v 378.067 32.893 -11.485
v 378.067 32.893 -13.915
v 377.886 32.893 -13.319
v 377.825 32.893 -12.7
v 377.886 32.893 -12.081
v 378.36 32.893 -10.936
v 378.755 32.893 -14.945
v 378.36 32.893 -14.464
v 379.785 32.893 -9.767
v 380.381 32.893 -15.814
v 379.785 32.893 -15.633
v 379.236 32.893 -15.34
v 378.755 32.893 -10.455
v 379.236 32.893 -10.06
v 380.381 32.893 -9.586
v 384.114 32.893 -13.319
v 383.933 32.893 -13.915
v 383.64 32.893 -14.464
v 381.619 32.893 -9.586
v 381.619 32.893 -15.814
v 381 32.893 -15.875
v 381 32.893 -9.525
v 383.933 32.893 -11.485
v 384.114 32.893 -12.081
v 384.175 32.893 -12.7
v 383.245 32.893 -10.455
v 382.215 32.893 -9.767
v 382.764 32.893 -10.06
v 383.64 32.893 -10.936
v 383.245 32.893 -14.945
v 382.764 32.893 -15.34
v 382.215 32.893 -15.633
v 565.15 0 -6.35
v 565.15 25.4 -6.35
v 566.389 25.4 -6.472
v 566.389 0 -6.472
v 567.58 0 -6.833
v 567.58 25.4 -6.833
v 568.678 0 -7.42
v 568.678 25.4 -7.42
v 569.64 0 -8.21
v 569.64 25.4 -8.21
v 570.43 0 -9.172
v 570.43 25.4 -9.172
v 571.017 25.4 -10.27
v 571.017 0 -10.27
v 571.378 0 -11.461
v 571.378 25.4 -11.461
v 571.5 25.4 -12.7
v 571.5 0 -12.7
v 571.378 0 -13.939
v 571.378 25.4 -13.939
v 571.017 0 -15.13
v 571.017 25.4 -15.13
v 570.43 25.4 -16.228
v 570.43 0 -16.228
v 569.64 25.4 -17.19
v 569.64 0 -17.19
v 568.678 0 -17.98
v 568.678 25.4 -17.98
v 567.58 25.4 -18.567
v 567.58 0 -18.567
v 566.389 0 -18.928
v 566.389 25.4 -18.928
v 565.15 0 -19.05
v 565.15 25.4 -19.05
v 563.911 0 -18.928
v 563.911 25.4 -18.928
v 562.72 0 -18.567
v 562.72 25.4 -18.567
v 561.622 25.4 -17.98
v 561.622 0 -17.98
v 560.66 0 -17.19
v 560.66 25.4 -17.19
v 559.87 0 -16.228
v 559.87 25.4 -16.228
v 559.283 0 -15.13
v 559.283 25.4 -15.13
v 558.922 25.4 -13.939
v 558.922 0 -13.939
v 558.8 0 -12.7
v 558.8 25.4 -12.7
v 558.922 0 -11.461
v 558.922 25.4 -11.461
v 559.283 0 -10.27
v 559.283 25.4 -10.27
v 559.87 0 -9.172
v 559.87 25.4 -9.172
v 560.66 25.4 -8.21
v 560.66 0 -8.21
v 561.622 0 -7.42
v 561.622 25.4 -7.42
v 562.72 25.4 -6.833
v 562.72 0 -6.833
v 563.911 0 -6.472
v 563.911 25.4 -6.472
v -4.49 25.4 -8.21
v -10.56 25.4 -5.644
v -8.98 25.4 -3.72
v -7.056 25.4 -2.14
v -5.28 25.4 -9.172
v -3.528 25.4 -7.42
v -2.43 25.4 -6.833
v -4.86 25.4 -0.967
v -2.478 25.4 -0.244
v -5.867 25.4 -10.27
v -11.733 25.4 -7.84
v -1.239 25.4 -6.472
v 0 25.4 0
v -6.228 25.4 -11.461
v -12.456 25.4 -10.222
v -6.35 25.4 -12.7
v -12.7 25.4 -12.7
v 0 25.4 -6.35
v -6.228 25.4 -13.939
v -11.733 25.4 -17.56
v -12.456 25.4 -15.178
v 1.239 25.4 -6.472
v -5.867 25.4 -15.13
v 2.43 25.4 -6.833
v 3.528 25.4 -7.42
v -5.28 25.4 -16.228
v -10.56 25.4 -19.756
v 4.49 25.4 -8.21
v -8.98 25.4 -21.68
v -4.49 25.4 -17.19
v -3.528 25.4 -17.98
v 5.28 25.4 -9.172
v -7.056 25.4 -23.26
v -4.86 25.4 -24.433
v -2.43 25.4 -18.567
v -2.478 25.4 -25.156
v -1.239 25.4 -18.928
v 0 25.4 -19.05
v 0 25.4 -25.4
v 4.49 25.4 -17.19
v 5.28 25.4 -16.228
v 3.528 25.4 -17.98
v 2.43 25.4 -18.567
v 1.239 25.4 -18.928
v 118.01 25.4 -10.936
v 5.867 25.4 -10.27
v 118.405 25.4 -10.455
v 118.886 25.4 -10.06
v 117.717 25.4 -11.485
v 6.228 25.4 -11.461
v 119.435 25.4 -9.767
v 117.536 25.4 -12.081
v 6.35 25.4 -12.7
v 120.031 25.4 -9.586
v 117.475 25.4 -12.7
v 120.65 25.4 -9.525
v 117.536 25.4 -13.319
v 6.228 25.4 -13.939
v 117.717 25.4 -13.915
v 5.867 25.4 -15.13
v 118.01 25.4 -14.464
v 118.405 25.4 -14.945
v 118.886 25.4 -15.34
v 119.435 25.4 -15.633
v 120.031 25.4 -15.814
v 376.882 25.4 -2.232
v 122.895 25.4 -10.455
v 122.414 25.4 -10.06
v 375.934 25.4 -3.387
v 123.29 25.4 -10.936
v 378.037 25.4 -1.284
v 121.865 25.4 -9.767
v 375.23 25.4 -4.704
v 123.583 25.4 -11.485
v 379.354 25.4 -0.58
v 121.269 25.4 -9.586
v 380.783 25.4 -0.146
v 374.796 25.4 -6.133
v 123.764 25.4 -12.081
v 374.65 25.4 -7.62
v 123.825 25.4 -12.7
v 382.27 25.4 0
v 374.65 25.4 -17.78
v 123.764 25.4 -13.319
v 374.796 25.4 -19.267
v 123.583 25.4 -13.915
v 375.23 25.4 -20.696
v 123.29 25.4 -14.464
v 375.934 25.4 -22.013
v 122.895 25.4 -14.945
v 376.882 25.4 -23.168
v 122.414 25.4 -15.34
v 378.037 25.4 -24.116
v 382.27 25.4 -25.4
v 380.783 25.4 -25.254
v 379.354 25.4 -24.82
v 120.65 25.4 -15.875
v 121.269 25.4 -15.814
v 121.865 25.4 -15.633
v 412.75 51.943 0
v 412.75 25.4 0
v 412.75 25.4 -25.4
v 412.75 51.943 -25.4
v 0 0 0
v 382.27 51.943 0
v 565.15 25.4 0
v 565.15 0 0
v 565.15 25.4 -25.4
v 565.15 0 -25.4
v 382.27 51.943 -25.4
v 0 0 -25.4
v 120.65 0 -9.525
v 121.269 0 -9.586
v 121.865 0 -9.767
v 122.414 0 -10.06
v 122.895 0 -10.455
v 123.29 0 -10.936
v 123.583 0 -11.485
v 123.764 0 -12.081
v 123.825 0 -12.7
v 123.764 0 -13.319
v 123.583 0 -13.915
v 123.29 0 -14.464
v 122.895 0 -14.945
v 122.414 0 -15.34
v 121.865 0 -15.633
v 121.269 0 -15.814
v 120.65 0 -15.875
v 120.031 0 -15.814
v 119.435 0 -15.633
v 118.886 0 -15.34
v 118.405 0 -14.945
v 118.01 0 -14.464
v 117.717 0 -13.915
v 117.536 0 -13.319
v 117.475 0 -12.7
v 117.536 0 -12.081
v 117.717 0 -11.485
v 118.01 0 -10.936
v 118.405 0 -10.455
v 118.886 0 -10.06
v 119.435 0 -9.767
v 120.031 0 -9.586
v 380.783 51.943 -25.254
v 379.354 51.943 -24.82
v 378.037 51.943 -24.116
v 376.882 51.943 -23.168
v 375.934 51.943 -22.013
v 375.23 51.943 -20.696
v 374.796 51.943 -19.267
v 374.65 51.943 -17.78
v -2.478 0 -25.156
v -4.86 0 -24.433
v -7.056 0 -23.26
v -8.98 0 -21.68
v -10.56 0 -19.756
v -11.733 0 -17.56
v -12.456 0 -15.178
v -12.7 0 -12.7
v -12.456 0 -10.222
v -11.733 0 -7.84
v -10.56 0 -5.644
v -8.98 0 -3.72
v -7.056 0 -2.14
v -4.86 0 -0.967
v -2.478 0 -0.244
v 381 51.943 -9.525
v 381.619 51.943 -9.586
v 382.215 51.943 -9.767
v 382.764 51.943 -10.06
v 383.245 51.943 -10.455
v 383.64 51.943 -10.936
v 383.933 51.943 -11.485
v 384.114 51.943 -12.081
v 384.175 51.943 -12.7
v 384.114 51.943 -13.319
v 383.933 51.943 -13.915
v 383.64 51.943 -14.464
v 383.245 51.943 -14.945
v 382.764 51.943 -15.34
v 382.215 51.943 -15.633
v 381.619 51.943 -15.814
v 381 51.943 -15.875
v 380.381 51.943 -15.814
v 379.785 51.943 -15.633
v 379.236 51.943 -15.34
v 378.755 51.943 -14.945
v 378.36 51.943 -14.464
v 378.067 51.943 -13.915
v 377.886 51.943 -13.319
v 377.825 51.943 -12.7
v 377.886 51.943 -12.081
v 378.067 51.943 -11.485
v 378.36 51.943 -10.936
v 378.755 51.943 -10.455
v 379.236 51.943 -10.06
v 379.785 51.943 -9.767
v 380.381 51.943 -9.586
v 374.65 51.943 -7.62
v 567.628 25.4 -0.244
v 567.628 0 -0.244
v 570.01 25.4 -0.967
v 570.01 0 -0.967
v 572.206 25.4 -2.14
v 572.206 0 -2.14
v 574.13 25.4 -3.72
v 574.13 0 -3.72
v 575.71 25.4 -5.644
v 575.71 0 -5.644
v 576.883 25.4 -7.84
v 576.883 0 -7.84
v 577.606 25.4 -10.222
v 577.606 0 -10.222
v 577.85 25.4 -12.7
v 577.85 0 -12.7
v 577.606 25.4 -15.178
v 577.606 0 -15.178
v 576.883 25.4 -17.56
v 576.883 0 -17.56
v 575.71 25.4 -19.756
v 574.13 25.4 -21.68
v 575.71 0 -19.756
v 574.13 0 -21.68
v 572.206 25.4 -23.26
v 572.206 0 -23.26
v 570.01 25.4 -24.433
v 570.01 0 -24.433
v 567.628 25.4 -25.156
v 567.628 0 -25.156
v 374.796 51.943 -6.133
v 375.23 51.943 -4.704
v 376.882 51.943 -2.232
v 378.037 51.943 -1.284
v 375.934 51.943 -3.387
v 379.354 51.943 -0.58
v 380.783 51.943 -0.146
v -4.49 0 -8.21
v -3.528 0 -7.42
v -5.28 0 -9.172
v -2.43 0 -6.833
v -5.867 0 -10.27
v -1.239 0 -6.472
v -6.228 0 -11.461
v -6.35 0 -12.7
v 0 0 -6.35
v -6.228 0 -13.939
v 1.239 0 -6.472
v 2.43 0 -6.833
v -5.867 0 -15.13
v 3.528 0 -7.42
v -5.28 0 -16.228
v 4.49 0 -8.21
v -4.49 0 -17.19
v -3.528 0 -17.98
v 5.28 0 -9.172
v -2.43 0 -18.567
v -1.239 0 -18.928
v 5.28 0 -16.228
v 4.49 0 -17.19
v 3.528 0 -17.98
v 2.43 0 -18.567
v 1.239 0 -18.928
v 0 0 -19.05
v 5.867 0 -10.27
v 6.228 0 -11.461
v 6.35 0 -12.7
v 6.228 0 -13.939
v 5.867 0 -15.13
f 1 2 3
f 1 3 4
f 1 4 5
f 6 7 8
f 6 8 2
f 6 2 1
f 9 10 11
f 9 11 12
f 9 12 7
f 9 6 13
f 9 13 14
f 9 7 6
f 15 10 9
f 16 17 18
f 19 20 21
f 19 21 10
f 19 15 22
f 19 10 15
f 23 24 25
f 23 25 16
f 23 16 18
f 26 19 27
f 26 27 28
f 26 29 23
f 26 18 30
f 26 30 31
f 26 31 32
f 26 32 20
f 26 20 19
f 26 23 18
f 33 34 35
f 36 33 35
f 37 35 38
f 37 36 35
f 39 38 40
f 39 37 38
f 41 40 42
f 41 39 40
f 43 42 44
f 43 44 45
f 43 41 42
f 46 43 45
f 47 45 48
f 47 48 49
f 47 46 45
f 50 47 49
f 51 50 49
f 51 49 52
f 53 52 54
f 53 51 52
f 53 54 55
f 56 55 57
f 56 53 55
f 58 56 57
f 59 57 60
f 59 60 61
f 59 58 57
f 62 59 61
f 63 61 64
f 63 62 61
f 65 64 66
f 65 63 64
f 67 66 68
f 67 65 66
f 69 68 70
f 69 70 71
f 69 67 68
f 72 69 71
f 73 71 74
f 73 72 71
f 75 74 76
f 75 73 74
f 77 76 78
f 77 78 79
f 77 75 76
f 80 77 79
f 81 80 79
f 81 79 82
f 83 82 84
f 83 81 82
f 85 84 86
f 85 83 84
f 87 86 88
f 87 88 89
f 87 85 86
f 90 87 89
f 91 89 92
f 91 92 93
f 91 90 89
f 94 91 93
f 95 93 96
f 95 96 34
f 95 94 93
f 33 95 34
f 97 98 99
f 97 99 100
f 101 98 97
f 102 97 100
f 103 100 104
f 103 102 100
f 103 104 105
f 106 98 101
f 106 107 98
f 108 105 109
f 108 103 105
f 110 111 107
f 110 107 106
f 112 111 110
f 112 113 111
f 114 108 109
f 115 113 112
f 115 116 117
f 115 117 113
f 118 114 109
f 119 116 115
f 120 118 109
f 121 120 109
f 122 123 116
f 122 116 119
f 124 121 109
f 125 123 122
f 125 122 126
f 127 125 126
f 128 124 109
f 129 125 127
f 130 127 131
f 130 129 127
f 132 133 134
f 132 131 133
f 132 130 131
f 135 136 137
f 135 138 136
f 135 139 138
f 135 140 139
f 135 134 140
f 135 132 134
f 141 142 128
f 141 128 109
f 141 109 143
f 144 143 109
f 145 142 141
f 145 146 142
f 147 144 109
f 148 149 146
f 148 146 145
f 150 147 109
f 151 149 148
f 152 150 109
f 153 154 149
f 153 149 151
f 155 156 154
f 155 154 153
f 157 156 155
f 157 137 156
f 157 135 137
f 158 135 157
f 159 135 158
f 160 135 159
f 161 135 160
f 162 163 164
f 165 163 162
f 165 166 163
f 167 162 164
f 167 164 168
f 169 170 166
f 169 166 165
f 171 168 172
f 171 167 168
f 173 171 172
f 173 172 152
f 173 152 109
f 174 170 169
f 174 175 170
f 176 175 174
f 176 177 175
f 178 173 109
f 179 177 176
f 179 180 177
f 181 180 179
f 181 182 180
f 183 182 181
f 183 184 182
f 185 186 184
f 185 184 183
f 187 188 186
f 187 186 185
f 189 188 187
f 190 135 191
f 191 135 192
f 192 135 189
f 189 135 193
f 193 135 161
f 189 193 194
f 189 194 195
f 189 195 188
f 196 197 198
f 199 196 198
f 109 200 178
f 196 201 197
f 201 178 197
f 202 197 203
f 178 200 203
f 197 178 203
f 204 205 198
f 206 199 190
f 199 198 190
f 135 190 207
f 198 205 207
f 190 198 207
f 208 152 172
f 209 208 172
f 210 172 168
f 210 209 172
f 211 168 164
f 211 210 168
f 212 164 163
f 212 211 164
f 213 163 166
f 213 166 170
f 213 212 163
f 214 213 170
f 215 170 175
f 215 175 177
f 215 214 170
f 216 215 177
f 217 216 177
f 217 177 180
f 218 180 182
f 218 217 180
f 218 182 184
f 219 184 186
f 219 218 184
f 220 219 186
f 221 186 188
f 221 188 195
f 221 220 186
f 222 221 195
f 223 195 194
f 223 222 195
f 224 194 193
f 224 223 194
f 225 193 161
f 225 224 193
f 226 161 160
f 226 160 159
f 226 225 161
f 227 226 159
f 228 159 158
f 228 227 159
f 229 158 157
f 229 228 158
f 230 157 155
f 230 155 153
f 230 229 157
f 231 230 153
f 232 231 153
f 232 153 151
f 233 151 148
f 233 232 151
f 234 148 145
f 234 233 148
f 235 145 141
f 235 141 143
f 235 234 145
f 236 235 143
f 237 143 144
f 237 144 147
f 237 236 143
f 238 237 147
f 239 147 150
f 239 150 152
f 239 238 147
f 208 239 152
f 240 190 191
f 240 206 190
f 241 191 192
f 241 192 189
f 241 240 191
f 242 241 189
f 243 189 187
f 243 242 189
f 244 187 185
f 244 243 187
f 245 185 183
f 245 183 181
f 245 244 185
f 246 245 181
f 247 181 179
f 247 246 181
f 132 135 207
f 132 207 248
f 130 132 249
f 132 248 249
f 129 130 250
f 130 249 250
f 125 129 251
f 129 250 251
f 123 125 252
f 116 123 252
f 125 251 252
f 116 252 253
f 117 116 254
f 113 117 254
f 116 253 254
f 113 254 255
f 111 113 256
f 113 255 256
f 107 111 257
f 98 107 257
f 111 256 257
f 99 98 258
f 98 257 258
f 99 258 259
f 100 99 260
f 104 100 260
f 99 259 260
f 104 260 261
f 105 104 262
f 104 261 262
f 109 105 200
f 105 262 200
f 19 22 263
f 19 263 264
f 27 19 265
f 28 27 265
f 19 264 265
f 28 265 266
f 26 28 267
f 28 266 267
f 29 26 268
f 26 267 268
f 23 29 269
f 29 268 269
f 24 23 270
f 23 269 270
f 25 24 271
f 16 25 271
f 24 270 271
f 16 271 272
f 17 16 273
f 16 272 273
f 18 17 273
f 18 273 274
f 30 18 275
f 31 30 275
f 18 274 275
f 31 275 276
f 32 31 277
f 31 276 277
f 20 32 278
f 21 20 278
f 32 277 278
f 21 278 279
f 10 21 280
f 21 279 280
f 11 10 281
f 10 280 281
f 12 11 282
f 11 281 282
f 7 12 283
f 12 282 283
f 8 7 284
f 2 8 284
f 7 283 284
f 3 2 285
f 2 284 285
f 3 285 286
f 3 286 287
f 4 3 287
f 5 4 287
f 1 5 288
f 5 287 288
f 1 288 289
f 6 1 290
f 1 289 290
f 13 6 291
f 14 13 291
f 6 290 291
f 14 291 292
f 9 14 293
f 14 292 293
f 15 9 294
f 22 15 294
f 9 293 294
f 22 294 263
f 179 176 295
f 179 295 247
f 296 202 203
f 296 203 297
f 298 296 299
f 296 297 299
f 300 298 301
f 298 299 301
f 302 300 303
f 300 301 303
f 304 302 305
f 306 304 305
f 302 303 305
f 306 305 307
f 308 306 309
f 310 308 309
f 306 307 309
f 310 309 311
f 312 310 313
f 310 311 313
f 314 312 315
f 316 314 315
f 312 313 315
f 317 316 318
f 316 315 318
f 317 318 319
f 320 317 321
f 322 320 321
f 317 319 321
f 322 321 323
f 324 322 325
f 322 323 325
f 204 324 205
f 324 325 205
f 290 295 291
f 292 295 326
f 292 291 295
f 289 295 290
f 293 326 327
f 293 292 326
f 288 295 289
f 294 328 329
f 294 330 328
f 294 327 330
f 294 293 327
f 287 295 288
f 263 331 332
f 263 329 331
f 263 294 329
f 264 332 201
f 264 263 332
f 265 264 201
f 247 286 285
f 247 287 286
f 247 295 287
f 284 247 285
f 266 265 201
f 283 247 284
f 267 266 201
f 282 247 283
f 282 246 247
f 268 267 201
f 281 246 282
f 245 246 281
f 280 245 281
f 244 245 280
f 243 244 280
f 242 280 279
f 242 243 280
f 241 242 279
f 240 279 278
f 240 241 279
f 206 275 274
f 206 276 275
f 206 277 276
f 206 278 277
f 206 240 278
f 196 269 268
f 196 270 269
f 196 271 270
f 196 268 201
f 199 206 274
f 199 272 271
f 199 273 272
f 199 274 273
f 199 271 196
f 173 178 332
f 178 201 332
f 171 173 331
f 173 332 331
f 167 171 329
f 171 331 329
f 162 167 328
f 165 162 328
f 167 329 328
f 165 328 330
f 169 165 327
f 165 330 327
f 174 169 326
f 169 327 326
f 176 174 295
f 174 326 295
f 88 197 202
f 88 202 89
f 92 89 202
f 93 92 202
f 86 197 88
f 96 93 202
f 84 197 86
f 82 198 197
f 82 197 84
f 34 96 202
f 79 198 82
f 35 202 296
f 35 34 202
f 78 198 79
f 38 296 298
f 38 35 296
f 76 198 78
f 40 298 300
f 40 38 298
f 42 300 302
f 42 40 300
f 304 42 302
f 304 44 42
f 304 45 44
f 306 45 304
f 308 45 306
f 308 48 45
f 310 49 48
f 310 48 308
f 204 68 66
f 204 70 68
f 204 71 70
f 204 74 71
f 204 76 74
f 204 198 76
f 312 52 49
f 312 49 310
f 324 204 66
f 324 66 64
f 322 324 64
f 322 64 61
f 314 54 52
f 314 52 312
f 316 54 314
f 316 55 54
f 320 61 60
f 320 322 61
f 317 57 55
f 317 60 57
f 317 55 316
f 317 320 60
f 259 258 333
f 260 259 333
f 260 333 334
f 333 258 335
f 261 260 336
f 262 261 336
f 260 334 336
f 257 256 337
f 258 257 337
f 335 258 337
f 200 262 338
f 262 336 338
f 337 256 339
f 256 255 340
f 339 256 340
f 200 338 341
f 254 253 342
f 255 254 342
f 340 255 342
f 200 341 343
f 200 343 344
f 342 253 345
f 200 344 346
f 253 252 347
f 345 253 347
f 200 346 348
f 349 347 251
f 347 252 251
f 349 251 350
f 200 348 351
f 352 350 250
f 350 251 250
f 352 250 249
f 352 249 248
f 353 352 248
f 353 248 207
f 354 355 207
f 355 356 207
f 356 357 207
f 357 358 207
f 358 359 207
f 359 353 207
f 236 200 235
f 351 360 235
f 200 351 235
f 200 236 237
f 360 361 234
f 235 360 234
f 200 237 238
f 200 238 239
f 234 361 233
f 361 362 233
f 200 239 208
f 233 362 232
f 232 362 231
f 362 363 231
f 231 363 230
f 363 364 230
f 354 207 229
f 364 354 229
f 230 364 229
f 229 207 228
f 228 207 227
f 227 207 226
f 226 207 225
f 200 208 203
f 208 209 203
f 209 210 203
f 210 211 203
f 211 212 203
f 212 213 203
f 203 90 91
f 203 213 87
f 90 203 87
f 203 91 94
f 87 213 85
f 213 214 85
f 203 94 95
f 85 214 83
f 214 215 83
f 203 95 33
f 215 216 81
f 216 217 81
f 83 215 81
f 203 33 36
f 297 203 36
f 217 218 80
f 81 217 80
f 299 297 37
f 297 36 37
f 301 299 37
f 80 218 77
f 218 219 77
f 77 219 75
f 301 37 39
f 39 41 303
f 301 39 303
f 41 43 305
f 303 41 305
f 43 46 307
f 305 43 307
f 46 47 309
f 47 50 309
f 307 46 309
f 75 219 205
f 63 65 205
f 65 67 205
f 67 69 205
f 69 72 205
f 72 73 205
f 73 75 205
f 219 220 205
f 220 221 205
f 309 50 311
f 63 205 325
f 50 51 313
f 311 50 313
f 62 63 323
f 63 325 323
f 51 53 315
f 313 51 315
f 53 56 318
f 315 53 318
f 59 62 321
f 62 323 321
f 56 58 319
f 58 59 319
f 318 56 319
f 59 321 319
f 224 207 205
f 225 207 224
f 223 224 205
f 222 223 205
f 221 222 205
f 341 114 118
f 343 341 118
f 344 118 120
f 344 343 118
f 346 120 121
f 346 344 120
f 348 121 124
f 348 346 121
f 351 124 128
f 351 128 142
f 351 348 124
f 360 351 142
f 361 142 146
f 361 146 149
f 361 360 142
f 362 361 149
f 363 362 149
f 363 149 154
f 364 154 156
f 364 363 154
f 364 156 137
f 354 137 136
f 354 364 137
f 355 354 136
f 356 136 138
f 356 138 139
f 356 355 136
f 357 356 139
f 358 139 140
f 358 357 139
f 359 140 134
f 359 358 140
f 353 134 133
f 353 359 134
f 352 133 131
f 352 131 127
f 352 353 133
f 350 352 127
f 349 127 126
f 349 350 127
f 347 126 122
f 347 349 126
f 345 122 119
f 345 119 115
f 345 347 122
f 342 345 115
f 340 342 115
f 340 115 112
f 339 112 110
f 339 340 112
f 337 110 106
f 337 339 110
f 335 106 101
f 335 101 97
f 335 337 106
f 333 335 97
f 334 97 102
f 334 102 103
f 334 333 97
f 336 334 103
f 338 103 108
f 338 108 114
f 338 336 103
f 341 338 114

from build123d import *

# Parameters (mm, degrees)
SKETCH2_R           = 6.35
SKETCH2_R_2         = 3.175
BOSS_EXTRUDE1_DEPTH = 25.4
SKETCH14_W          = 38.1
SKETCH14_H          = 25.4
BOSS_EXTRUDE2_DEPTH = 26.543
SKETCH15_R          = 3.175
CUT_EXTRUDE1_DEPTH  = 19.05
FILLET1_R           = 7.62


with BuildPart() as part:
    # Sketch2 → Boss-Extrude1 (new body)
    with BuildSketch(Plane(origin=(0, 0, 0), x_dir=(1, 0, 0), z_dir=(0, 1, 0))):
        with BuildLine():
            ThreePointArc((0, 25.4), (-12.7, 12.7), (0, 0))
            Line((0, 0), (565.15, 0))
            ThreePointArc((565.15, 0), (577.85, 12.7), (565.15, 25.4))
            Line((565.15, 25.4), (0, 25.4))
        make_face()
        with Locations(Location((0, 12.7, 0), (0, 0, 270))):
            Circle(SKETCH2_R, mode=Mode.SUBTRACT)
        with Locations(Location((120.65, 12.7, 0), (0, 0, 270))):
            Circle(SKETCH2_R_2, mode=Mode.SUBTRACT)
        with Locations(Location((565.15, 12.7, 0), (0, 0, 270))):
            Circle(SKETCH2_R, mode=Mode.SUBTRACT)
    extrude(amount=BOSS_EXTRUDE1_DEPTH)

    # Sketch14 → Boss-Extrude2 (add)
    with BuildSketch(Plane(origin=(0, 25.4, 0), x_dir=(1, 0, 0), z_dir=(0, 1, 0))):
        with Locations((393.7, 12.7)):
            Rectangle(SKETCH14_W, SKETCH14_H)
    extrude(amount=BOSS_EXTRUDE2_DEPTH)

    # Sketch15 → Cut-Extrude1 (cut)
    with BuildSketch(Plane(origin=(0, 51.943, 0), x_dir=(1, 0, 0), z_dir=(0, 1, 0))):
        with Locations(Location((381, 12.7, 0), (0, 0, 270))):
            Circle(SKETCH15_R)
    extrude(amount=-CUT_EXTRUDE1_DEPTH, mode=Mode.SUBTRACT)

    # Fillet1
    fillet1_edges = [part.edges().sort_by_distance(p)[0] for p in [
        (374.65, 38.6715, 0),
        (374.65, 38.6715, -25.4),
    ]]
    fillet(fillet1_edges, radius=FILLET1_R)


solid = part.part
